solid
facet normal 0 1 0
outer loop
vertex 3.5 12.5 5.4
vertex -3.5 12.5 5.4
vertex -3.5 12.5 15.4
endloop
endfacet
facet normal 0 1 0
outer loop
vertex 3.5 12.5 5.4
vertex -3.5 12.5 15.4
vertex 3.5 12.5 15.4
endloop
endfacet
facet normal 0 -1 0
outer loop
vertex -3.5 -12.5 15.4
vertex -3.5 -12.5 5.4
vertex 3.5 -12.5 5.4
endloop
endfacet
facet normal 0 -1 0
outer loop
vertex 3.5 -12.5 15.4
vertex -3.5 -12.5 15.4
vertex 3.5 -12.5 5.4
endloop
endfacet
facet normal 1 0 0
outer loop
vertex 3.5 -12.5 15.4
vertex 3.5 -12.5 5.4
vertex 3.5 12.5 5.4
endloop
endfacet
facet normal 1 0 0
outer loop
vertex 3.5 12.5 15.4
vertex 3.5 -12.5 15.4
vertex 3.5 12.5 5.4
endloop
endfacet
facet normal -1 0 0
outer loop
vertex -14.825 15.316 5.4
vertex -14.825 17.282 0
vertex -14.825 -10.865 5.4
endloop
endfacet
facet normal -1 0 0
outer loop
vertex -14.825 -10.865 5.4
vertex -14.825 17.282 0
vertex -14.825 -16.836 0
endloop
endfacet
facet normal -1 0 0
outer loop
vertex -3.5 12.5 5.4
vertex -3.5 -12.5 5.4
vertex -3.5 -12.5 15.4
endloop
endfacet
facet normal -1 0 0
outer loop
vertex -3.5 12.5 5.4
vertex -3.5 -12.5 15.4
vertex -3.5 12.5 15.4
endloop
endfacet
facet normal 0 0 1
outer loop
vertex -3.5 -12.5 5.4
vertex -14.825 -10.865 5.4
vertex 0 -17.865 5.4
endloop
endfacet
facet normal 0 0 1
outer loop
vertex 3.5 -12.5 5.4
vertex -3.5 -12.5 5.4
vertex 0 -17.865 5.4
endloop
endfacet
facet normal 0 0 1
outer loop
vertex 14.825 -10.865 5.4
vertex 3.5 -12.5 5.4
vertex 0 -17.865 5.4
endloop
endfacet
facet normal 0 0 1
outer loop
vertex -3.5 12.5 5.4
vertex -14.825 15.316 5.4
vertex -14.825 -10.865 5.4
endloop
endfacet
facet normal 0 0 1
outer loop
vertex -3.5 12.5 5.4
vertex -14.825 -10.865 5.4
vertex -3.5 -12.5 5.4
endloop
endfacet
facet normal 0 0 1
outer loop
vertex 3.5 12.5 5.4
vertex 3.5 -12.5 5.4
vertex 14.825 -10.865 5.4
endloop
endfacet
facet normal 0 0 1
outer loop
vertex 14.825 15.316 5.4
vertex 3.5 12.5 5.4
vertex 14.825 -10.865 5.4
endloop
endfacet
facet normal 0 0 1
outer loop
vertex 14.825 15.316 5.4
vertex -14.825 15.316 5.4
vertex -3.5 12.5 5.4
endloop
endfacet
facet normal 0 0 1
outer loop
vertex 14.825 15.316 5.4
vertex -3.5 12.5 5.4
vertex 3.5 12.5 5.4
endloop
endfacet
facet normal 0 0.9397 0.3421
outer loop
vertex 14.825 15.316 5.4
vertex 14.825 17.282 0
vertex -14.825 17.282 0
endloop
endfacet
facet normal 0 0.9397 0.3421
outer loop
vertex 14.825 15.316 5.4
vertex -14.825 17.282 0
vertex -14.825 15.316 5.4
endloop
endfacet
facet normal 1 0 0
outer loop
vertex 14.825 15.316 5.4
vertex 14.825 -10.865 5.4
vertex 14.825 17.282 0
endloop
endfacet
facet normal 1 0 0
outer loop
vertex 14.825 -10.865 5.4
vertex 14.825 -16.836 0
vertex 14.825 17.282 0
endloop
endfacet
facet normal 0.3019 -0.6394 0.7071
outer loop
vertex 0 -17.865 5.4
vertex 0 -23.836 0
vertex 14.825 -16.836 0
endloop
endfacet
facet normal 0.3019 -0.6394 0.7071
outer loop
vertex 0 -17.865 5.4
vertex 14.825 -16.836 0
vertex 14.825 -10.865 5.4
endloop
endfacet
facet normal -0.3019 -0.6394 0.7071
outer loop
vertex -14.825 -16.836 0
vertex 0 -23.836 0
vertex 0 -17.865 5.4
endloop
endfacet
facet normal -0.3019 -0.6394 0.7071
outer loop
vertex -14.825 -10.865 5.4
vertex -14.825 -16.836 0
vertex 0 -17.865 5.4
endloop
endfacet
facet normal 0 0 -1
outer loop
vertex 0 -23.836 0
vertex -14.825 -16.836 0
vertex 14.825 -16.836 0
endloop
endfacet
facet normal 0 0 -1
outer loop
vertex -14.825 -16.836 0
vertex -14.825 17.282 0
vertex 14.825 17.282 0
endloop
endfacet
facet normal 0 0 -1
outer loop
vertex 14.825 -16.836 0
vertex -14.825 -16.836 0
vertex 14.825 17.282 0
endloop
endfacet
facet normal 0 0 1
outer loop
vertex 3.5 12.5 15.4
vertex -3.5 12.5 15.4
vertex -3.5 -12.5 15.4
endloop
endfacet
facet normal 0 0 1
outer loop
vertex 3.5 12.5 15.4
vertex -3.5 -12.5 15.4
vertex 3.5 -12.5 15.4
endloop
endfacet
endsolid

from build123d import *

# Parameters (mm, degrees)
RESSALTO_EXTRUS_O1_DEPTH = 5.4
CHANFRO1_SIZE            = 6
ESBO_O2_W                = 7
ESBO_O2_H                = 25
RESSALTO_EXTRUS_O2_DEPTH = 10
CHANFRO2_SIZE            = 6
CHANFRO2_SIZE_2          = 2.183821406


with BuildPart() as part:
    # Esboço1 → Ressalto-extrusão1 (new body)
    with BuildSketch(Plane.XY):
        Polygon((-14.825, -17.5), (0, -24.5), (14.825, -17.5), (14.825, 17.5), (-14.825, 17.5), align=None)
    extrude(amount=RESSALTO_EXTRUS_O1_DEPTH)

    # Chanfro1
    # the kernel refuses this chamfer: 6 mm, written as the material it takes off along each edge
    with BuildSketch(Plane(origin=(-13.952897525, -31.088214683, 5.4), x_dir=(0.01173996035917391, -0.024863558903536174, -0.9996219169112968), z_dir=(0.9042650014643773, 0.4269716701686773, 0)), Plane(origin=(-28.777897525, -10.911785317, 5.4), x_dir=(-0.01173996035917391, -0.024863558903536174, -0.9996219169112968), z_dir=(0.9042650014643773, -0.4269716701686773, 0))) as chanfro1_piece_1:
        Polygon((CHANFRO1_SIZE * 0.999621916911, CHANFRO1_SIZE * 0.0274958766106), (-CHANFRO1_SIZE * 0.0274958766106, CHANFRO1_SIZE * 0.999621916911), (0, 0), align=None)
    extrude(amount=47.254726193, mode=Mode.SUBTRACT)

    # Esboço2 → Ressalto-extrusão2 (add)
    with BuildSketch(Plane.XY.offset(5.4)):
        Rectangle(ESBO_O2_W, ESBO_O2_H)
    extrude(amount=RESSALTO_EXTRUS_O2_DEPTH)

    # Chanfro2
    # the kernel refuses this chamfer: 6, 2.183821406 mm, written as the material it takes off along each edge
    with BuildSketch(Plane(origin=(30.390168395, 17.5, 5.4), x_dir=(0, 0.013184058198645722, -0.9999130865277315), z_dir=(-1, 0, 0))) as chanfro2_piece_1:
        Polygon((CHANFRO2_SIZE * 0.999913086528, CHANFRO2_SIZE * 0.0131840581986), (-CHANFRO2_SIZE_2 * 0.0131840581962, CHANFRO2_SIZE_2 * 0.999913086343), (0, 0), align=None)
    extrude(amount=60.780336791, mode=Mode.SUBTRACT)


solid = part.part
